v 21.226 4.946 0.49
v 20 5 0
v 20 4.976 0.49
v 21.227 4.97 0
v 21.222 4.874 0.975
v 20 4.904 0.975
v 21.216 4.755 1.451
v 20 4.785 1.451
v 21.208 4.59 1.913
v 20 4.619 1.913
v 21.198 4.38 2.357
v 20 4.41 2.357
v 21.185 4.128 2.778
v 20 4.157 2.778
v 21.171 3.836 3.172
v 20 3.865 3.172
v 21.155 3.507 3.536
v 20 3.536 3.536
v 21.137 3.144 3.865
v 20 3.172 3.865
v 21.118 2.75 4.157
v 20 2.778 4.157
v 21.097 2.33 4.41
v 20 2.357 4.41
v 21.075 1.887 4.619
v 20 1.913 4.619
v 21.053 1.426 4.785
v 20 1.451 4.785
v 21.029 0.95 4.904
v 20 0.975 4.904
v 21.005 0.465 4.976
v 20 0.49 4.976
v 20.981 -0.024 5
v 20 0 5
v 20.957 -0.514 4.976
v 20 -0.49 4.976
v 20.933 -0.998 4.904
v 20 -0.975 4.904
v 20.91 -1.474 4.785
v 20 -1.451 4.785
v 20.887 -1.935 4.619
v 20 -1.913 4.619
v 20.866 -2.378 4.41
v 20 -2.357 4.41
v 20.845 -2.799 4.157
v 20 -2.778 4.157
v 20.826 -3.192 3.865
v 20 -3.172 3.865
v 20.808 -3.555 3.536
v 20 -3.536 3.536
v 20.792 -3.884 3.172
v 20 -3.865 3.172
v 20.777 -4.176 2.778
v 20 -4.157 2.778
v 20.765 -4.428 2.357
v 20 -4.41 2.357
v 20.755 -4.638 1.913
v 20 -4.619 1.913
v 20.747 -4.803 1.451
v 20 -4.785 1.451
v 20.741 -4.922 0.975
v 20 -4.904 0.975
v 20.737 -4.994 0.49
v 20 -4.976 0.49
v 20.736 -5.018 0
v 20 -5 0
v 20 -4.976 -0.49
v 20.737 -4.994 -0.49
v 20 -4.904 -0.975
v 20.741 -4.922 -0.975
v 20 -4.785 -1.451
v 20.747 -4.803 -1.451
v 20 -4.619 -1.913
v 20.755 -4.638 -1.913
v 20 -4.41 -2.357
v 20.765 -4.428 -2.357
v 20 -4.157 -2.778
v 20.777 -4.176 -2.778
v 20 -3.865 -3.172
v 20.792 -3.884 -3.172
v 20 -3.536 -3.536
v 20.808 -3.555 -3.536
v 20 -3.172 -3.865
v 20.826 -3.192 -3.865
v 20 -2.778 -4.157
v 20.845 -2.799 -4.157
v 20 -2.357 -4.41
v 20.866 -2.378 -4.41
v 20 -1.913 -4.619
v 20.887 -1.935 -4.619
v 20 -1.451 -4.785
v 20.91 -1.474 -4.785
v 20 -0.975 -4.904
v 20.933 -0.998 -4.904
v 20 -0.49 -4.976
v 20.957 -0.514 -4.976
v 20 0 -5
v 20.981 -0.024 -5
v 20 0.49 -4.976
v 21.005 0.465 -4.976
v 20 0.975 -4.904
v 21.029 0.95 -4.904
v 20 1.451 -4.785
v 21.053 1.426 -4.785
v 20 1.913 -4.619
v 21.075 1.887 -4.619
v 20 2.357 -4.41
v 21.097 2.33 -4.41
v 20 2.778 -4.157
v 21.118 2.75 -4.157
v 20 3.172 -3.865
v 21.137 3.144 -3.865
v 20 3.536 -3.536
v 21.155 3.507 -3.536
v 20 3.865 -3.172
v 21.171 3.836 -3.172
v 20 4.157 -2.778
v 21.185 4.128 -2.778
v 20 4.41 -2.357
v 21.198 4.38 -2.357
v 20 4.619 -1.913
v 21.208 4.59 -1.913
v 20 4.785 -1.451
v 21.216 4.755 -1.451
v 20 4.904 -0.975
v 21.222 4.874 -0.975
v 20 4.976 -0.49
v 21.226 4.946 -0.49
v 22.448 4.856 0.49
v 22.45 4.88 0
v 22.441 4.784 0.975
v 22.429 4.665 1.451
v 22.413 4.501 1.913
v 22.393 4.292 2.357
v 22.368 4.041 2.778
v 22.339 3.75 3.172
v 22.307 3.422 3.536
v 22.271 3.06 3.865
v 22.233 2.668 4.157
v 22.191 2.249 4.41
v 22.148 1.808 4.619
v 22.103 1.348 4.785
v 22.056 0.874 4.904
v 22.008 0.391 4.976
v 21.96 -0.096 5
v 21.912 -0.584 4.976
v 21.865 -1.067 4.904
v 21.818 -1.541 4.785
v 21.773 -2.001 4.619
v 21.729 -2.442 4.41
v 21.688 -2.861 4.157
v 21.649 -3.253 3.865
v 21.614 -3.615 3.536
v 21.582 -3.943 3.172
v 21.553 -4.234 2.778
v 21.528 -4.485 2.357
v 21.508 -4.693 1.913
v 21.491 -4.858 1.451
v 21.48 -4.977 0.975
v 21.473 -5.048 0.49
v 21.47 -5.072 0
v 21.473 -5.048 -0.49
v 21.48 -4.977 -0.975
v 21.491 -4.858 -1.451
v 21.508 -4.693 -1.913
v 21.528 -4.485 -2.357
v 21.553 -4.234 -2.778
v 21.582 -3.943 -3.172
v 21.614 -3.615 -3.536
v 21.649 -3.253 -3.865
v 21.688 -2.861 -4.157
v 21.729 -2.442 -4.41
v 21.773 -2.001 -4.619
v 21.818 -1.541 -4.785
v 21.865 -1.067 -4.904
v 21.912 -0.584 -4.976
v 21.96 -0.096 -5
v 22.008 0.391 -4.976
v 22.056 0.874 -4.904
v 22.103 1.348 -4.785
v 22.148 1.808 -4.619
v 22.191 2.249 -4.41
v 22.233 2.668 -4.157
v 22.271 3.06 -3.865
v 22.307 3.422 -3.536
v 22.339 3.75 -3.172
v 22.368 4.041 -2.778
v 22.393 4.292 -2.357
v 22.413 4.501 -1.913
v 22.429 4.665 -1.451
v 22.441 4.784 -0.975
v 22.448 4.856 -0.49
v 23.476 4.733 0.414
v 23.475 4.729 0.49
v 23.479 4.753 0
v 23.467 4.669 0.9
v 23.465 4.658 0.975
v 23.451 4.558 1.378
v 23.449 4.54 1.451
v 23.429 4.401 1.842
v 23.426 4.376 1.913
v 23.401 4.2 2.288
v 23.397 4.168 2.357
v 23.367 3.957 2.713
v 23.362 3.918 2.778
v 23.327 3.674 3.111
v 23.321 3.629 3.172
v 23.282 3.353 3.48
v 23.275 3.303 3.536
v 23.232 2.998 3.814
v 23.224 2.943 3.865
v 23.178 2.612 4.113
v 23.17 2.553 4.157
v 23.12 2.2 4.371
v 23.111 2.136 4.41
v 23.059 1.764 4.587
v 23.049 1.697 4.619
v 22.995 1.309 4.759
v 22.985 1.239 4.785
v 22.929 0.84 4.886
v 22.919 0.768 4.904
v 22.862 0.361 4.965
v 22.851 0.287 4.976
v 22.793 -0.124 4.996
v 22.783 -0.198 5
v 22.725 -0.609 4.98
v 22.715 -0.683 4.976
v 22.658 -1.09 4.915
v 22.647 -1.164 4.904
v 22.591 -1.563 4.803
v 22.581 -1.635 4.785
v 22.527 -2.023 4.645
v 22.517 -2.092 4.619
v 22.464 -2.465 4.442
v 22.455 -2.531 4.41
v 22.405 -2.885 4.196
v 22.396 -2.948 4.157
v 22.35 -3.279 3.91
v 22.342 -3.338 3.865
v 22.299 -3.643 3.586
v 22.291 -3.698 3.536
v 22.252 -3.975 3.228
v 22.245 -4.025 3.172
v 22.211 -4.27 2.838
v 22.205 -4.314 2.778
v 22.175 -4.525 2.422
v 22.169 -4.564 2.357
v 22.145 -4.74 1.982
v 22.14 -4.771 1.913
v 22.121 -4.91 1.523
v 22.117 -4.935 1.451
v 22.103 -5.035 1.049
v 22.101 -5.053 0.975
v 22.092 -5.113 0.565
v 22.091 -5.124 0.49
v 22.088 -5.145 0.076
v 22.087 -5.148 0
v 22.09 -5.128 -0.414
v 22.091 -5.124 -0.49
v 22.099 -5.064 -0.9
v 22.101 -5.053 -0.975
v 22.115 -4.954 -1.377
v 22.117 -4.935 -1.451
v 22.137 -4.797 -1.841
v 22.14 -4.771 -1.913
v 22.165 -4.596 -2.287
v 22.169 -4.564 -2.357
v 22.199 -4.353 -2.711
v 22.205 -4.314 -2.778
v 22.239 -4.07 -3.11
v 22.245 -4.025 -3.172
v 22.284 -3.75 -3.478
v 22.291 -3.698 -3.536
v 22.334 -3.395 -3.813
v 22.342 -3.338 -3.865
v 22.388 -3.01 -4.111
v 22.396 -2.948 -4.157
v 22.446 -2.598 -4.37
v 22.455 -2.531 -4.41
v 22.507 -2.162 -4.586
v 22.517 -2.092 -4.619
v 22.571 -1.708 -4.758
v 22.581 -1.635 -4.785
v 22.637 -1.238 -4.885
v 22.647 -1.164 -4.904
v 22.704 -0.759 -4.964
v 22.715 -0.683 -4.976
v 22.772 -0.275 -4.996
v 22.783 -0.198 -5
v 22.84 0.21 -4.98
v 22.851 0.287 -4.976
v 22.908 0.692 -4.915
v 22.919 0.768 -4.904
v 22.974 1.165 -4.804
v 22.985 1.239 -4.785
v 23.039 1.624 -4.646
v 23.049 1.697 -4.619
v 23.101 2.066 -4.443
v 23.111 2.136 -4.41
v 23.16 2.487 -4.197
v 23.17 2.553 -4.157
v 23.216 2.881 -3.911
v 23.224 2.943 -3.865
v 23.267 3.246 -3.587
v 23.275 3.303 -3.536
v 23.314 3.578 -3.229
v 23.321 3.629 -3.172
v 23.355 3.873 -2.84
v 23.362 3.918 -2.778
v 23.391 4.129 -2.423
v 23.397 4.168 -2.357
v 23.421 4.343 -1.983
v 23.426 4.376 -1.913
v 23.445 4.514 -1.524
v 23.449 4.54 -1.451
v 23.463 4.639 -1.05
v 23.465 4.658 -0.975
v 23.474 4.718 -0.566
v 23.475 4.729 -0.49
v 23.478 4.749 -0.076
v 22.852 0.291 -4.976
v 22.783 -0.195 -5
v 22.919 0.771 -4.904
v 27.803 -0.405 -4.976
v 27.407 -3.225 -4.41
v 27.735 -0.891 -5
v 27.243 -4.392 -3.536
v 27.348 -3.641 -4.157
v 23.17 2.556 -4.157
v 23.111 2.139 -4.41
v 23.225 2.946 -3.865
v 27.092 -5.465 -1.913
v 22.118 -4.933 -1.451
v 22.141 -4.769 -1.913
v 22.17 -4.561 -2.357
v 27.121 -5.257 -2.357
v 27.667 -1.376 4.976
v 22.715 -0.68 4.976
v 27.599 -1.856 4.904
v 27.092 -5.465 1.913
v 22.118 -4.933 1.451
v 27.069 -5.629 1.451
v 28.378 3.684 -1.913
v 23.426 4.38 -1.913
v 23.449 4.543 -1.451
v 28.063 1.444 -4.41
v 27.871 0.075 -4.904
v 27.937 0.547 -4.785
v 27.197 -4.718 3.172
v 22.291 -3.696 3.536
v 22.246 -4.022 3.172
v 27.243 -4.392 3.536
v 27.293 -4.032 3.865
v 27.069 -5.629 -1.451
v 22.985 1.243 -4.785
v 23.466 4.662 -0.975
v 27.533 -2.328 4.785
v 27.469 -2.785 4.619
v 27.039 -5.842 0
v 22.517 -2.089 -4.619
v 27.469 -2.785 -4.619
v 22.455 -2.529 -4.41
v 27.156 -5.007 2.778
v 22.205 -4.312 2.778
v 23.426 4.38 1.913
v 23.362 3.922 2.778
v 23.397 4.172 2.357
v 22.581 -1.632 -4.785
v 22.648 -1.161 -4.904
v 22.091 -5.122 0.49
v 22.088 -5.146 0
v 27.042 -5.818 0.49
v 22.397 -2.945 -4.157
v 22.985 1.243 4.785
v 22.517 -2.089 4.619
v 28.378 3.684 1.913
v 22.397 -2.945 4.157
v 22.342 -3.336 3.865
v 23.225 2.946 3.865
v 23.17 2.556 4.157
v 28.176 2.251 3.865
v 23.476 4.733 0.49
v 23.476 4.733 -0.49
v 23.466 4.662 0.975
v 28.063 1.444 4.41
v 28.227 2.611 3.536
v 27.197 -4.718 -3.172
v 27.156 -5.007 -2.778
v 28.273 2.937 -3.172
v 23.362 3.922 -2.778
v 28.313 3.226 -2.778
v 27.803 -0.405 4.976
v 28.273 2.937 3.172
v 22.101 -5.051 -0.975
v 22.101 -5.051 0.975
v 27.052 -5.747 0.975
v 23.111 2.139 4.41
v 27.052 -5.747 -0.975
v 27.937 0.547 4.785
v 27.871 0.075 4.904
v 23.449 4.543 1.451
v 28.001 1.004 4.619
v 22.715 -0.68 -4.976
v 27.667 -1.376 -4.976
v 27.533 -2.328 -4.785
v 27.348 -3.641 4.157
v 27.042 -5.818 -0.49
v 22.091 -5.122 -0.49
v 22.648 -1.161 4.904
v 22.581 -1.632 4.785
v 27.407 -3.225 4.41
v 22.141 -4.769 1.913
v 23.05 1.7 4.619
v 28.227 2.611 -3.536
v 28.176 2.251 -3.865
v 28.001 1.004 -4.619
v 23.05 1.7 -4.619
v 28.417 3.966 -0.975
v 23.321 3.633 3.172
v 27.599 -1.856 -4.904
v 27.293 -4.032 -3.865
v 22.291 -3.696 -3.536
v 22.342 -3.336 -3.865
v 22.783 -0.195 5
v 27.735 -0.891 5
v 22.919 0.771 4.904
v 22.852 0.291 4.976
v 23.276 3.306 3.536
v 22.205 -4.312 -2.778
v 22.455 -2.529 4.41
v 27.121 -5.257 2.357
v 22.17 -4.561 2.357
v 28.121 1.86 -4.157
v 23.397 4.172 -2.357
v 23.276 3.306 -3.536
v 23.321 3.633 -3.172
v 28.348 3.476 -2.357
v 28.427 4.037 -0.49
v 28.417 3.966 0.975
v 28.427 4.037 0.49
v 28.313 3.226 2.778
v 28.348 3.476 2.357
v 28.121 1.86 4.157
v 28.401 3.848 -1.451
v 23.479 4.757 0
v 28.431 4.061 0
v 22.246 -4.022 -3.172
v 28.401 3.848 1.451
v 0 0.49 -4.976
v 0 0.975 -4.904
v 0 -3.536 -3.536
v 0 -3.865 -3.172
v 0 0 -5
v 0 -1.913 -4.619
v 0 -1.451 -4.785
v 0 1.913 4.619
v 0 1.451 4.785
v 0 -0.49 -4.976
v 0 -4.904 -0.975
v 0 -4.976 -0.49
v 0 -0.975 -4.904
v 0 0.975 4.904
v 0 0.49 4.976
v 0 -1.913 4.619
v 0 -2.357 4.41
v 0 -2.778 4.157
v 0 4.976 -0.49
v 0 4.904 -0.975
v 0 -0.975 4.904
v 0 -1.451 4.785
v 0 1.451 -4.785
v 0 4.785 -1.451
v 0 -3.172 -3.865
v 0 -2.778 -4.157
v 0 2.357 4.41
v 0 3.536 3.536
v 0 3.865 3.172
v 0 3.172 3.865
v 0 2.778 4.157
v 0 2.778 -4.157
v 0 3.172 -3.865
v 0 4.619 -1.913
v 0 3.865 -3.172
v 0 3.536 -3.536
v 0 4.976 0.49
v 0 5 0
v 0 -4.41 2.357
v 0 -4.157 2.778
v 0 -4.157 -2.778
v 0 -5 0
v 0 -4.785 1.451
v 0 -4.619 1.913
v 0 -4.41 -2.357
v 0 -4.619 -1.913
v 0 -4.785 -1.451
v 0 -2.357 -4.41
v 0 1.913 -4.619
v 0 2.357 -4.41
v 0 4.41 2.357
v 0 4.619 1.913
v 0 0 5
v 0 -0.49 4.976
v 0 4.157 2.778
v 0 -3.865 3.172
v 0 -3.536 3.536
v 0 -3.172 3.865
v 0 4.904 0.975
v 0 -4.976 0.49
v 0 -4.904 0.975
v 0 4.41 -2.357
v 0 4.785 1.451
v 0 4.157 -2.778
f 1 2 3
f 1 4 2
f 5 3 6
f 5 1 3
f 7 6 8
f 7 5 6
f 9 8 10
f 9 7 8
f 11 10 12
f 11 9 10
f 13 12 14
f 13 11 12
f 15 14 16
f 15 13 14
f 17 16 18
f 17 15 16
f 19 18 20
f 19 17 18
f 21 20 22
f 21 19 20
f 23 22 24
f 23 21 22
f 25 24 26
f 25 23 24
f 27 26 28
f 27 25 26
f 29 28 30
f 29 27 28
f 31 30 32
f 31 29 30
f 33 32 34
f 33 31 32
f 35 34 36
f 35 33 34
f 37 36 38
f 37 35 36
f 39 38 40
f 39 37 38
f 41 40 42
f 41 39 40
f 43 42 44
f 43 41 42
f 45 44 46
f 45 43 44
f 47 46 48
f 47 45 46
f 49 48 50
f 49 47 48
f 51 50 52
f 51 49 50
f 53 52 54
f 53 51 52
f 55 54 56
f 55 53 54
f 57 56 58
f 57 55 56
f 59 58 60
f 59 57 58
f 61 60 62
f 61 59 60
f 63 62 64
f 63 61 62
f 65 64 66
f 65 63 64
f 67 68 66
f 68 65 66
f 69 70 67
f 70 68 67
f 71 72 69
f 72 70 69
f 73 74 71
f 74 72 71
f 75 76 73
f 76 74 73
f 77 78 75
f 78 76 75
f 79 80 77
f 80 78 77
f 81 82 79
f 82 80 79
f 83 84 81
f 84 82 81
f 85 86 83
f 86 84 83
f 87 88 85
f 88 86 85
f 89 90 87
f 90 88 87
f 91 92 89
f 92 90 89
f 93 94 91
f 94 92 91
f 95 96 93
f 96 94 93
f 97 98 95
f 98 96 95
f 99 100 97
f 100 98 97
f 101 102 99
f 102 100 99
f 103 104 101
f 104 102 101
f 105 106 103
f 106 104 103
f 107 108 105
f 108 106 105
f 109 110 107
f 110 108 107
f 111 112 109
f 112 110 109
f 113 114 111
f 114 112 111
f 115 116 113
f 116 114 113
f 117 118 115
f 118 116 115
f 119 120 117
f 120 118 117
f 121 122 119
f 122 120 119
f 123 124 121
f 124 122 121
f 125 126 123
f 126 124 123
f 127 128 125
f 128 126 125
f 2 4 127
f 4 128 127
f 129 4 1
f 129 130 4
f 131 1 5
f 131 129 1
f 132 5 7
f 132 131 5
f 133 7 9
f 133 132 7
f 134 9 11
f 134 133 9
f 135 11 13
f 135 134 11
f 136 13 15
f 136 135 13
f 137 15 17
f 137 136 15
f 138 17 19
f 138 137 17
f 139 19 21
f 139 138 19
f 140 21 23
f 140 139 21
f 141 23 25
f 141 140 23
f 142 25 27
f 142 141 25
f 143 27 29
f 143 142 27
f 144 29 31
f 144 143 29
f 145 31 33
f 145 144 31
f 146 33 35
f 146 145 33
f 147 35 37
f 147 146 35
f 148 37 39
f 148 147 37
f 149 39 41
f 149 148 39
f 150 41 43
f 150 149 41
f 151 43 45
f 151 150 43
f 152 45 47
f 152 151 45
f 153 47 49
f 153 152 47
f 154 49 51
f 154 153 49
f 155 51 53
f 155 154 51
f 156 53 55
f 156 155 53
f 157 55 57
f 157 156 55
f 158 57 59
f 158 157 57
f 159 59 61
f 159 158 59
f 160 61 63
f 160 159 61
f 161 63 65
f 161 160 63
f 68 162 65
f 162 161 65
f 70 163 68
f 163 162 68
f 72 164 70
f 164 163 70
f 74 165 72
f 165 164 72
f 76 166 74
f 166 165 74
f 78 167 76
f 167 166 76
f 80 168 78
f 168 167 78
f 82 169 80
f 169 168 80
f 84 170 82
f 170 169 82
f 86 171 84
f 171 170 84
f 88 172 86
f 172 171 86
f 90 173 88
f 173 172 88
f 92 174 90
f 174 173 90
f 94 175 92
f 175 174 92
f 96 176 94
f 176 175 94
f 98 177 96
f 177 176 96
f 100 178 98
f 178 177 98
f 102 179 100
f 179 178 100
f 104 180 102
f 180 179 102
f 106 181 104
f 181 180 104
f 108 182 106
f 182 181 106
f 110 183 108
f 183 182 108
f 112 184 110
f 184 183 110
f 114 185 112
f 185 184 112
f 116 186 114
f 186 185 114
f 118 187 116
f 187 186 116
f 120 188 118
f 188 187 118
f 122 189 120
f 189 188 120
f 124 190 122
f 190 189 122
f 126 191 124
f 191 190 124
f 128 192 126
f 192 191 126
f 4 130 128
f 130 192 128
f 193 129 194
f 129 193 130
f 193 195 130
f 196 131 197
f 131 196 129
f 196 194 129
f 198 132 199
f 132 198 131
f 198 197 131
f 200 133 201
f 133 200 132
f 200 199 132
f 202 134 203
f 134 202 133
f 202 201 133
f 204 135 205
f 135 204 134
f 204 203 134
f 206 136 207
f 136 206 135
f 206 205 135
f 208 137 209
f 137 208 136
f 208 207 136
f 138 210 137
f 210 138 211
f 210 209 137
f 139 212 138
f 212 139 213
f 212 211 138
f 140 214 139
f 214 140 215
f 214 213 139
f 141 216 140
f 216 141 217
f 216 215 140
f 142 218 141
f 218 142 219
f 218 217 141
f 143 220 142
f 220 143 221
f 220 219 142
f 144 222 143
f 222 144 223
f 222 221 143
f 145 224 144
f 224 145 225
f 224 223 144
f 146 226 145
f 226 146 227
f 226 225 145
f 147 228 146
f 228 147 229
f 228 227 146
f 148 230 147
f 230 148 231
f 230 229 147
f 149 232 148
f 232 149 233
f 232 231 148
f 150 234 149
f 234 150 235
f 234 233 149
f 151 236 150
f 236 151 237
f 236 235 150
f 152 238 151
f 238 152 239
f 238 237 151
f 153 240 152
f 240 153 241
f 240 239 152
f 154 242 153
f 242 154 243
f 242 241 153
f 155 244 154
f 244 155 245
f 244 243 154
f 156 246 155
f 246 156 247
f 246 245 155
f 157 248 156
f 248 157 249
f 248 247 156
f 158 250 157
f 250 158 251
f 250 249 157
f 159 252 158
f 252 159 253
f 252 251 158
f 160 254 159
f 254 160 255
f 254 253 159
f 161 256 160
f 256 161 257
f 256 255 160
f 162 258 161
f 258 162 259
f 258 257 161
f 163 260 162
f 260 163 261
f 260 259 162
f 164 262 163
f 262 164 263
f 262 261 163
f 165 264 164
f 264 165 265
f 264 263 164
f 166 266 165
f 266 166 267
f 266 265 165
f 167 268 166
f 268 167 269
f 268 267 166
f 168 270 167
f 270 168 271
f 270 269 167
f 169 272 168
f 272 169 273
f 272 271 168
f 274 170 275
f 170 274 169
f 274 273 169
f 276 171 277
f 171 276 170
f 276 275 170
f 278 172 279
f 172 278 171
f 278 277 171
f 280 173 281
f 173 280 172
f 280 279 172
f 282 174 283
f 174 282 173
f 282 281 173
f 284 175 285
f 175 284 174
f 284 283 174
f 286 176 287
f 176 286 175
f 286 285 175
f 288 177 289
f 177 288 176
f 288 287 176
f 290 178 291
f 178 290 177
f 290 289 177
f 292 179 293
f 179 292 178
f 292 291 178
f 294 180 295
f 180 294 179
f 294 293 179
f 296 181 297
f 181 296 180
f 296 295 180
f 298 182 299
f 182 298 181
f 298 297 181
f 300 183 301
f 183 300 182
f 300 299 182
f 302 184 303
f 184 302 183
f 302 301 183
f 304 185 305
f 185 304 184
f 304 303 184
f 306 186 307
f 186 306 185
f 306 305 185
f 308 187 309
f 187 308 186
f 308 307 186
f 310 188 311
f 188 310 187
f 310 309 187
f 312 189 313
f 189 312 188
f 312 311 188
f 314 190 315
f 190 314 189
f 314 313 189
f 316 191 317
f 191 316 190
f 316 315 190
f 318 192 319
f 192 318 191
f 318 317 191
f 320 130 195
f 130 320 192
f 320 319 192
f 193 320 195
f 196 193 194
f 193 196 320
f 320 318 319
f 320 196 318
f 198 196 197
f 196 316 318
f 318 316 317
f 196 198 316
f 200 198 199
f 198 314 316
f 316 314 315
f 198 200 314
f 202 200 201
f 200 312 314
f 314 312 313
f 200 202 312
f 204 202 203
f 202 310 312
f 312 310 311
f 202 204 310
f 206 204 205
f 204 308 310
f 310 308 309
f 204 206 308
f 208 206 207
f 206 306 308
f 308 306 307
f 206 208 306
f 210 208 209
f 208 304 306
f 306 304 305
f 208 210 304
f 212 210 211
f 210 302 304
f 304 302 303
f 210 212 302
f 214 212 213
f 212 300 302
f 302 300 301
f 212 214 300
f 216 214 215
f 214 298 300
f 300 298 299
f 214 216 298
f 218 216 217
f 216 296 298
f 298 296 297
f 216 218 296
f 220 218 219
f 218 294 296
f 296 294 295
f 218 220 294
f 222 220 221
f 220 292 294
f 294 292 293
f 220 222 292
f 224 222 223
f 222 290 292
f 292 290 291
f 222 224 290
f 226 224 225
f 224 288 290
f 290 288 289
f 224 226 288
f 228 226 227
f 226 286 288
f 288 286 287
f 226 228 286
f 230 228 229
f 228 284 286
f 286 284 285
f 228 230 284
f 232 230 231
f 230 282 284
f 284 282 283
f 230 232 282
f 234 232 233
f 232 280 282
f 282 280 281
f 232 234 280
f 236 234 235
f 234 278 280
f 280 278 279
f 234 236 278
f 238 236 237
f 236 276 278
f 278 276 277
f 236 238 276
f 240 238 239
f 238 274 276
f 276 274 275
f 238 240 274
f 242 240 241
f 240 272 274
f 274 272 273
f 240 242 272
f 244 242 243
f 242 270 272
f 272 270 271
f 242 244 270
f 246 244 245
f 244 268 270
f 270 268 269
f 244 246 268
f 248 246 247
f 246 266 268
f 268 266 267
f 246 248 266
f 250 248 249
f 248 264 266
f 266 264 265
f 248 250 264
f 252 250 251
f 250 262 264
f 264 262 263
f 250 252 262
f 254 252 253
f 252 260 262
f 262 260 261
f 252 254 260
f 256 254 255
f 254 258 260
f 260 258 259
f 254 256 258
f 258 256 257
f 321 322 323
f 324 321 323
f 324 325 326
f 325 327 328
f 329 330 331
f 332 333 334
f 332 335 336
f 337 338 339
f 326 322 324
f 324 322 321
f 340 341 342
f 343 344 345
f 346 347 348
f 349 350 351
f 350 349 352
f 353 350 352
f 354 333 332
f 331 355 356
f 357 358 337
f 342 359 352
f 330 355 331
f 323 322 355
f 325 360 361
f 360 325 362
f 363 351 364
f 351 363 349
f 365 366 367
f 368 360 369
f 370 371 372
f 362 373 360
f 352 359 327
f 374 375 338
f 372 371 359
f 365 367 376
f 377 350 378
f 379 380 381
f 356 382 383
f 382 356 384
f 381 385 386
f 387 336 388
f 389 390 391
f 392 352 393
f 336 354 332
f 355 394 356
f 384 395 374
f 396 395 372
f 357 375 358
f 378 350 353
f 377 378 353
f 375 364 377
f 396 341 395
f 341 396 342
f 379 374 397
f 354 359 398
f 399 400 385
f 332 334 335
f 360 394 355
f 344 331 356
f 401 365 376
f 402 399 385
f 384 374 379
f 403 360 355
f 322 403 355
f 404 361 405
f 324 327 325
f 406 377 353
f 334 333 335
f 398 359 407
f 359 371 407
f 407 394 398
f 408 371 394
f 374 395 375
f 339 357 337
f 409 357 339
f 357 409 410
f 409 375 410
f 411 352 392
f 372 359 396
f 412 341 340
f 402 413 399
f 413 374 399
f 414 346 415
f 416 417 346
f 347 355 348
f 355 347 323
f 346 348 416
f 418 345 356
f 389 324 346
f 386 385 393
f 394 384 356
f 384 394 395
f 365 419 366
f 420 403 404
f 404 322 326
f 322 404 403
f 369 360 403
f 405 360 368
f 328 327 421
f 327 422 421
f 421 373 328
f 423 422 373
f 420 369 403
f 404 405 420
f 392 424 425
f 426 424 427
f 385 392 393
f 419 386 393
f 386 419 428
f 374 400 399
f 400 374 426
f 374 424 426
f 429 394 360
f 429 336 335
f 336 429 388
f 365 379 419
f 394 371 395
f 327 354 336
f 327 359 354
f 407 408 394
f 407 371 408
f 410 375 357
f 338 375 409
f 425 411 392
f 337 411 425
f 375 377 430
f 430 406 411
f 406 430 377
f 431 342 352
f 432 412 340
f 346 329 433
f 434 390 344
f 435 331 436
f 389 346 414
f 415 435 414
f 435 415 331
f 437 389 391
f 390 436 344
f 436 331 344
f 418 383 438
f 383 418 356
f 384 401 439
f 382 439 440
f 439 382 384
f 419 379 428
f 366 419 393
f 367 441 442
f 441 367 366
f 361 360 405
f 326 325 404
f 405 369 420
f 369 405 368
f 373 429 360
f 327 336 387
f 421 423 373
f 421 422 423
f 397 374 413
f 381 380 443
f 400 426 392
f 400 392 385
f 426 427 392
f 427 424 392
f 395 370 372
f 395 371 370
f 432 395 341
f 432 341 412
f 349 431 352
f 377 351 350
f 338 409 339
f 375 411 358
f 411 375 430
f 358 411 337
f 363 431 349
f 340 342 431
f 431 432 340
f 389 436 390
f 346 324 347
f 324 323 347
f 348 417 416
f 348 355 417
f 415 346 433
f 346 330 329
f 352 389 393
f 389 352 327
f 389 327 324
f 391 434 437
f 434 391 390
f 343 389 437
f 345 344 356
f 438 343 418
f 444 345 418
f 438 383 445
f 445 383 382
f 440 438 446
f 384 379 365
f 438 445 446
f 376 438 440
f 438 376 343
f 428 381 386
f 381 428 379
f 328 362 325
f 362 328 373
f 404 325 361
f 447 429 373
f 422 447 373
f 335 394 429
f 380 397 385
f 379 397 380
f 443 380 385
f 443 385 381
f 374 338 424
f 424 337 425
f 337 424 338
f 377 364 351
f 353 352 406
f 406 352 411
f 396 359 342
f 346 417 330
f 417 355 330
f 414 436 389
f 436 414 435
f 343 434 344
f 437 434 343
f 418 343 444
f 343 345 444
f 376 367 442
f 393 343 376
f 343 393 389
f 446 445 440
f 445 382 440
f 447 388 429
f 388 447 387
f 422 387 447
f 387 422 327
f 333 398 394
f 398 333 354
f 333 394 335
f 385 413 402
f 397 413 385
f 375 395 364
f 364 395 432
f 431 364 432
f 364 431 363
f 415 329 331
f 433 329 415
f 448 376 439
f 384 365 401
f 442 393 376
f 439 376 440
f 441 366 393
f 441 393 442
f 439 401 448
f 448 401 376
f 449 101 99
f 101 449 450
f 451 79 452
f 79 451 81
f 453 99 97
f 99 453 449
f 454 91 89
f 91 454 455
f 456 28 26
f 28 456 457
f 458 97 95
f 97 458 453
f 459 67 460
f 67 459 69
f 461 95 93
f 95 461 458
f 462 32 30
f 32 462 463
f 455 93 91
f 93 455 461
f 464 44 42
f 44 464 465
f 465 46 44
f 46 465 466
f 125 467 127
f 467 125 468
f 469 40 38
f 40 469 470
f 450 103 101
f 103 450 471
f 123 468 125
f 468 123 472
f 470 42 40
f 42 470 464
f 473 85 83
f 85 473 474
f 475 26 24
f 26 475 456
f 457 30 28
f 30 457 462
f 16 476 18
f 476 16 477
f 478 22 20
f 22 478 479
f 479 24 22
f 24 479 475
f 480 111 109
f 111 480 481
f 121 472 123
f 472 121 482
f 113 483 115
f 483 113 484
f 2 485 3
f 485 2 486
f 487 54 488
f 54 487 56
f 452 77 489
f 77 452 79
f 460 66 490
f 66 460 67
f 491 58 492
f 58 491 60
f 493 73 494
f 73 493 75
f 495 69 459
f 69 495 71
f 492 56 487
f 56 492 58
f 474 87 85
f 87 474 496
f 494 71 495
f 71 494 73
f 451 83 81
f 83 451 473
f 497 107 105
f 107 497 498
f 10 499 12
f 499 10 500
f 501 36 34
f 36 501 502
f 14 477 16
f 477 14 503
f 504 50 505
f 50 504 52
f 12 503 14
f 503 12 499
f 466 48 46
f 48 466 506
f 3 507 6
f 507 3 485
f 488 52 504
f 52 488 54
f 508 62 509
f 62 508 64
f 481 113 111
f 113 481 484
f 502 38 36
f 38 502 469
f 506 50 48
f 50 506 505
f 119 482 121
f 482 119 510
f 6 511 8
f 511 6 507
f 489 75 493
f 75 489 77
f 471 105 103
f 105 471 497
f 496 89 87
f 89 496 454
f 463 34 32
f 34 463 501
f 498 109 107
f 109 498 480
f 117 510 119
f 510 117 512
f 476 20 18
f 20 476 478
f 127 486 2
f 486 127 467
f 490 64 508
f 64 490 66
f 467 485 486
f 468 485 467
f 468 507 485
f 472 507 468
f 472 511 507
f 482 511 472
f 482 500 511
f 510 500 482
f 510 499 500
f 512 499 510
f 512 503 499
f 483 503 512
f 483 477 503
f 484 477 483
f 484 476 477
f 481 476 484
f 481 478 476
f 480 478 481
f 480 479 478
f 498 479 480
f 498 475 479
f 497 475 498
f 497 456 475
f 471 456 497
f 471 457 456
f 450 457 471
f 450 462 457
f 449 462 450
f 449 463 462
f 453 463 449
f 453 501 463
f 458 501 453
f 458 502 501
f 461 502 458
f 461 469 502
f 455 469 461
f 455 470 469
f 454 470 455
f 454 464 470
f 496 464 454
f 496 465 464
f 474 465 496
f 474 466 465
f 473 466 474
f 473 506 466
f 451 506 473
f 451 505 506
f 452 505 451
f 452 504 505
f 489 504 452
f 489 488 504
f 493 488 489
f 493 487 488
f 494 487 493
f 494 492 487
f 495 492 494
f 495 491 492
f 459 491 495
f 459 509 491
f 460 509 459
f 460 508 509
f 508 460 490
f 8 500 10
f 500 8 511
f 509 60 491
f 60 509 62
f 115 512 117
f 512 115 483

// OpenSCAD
$fn=64;
union(){translate(v = [20, 0])
union(){color("yellow"){translate(v = [0, -20])
intersection(){rotate_extrude($fn = 128){translate(v = [20, 0])
circle($fn = 64, r = 5.000);
}
translate(v = [0, 0, -50])
linear_extrude(height = 100){scale(v = 2)
polygon(points = [[0, 0], [0, 25.0], [3.479327524001636, 24.756701718539258]]);
}
}
}
translate(v = [2.7834620192013086, -0.19463862516859365])
rotate(a = [0, 0, -8])
rotate(a = [0, 90, 0])
rotate(a = [0, 0, 0])
color("red"){linear_extrude(height = 5){circle($fn = 64, r = 5.000);
}
}
}
rotate(a = [0, 90, 0])
rotate(a = [0, 0, 0])
color("blue"){linear_extrude(height = 20){circle($fn = 64, r = 5.000);
}
}
}
